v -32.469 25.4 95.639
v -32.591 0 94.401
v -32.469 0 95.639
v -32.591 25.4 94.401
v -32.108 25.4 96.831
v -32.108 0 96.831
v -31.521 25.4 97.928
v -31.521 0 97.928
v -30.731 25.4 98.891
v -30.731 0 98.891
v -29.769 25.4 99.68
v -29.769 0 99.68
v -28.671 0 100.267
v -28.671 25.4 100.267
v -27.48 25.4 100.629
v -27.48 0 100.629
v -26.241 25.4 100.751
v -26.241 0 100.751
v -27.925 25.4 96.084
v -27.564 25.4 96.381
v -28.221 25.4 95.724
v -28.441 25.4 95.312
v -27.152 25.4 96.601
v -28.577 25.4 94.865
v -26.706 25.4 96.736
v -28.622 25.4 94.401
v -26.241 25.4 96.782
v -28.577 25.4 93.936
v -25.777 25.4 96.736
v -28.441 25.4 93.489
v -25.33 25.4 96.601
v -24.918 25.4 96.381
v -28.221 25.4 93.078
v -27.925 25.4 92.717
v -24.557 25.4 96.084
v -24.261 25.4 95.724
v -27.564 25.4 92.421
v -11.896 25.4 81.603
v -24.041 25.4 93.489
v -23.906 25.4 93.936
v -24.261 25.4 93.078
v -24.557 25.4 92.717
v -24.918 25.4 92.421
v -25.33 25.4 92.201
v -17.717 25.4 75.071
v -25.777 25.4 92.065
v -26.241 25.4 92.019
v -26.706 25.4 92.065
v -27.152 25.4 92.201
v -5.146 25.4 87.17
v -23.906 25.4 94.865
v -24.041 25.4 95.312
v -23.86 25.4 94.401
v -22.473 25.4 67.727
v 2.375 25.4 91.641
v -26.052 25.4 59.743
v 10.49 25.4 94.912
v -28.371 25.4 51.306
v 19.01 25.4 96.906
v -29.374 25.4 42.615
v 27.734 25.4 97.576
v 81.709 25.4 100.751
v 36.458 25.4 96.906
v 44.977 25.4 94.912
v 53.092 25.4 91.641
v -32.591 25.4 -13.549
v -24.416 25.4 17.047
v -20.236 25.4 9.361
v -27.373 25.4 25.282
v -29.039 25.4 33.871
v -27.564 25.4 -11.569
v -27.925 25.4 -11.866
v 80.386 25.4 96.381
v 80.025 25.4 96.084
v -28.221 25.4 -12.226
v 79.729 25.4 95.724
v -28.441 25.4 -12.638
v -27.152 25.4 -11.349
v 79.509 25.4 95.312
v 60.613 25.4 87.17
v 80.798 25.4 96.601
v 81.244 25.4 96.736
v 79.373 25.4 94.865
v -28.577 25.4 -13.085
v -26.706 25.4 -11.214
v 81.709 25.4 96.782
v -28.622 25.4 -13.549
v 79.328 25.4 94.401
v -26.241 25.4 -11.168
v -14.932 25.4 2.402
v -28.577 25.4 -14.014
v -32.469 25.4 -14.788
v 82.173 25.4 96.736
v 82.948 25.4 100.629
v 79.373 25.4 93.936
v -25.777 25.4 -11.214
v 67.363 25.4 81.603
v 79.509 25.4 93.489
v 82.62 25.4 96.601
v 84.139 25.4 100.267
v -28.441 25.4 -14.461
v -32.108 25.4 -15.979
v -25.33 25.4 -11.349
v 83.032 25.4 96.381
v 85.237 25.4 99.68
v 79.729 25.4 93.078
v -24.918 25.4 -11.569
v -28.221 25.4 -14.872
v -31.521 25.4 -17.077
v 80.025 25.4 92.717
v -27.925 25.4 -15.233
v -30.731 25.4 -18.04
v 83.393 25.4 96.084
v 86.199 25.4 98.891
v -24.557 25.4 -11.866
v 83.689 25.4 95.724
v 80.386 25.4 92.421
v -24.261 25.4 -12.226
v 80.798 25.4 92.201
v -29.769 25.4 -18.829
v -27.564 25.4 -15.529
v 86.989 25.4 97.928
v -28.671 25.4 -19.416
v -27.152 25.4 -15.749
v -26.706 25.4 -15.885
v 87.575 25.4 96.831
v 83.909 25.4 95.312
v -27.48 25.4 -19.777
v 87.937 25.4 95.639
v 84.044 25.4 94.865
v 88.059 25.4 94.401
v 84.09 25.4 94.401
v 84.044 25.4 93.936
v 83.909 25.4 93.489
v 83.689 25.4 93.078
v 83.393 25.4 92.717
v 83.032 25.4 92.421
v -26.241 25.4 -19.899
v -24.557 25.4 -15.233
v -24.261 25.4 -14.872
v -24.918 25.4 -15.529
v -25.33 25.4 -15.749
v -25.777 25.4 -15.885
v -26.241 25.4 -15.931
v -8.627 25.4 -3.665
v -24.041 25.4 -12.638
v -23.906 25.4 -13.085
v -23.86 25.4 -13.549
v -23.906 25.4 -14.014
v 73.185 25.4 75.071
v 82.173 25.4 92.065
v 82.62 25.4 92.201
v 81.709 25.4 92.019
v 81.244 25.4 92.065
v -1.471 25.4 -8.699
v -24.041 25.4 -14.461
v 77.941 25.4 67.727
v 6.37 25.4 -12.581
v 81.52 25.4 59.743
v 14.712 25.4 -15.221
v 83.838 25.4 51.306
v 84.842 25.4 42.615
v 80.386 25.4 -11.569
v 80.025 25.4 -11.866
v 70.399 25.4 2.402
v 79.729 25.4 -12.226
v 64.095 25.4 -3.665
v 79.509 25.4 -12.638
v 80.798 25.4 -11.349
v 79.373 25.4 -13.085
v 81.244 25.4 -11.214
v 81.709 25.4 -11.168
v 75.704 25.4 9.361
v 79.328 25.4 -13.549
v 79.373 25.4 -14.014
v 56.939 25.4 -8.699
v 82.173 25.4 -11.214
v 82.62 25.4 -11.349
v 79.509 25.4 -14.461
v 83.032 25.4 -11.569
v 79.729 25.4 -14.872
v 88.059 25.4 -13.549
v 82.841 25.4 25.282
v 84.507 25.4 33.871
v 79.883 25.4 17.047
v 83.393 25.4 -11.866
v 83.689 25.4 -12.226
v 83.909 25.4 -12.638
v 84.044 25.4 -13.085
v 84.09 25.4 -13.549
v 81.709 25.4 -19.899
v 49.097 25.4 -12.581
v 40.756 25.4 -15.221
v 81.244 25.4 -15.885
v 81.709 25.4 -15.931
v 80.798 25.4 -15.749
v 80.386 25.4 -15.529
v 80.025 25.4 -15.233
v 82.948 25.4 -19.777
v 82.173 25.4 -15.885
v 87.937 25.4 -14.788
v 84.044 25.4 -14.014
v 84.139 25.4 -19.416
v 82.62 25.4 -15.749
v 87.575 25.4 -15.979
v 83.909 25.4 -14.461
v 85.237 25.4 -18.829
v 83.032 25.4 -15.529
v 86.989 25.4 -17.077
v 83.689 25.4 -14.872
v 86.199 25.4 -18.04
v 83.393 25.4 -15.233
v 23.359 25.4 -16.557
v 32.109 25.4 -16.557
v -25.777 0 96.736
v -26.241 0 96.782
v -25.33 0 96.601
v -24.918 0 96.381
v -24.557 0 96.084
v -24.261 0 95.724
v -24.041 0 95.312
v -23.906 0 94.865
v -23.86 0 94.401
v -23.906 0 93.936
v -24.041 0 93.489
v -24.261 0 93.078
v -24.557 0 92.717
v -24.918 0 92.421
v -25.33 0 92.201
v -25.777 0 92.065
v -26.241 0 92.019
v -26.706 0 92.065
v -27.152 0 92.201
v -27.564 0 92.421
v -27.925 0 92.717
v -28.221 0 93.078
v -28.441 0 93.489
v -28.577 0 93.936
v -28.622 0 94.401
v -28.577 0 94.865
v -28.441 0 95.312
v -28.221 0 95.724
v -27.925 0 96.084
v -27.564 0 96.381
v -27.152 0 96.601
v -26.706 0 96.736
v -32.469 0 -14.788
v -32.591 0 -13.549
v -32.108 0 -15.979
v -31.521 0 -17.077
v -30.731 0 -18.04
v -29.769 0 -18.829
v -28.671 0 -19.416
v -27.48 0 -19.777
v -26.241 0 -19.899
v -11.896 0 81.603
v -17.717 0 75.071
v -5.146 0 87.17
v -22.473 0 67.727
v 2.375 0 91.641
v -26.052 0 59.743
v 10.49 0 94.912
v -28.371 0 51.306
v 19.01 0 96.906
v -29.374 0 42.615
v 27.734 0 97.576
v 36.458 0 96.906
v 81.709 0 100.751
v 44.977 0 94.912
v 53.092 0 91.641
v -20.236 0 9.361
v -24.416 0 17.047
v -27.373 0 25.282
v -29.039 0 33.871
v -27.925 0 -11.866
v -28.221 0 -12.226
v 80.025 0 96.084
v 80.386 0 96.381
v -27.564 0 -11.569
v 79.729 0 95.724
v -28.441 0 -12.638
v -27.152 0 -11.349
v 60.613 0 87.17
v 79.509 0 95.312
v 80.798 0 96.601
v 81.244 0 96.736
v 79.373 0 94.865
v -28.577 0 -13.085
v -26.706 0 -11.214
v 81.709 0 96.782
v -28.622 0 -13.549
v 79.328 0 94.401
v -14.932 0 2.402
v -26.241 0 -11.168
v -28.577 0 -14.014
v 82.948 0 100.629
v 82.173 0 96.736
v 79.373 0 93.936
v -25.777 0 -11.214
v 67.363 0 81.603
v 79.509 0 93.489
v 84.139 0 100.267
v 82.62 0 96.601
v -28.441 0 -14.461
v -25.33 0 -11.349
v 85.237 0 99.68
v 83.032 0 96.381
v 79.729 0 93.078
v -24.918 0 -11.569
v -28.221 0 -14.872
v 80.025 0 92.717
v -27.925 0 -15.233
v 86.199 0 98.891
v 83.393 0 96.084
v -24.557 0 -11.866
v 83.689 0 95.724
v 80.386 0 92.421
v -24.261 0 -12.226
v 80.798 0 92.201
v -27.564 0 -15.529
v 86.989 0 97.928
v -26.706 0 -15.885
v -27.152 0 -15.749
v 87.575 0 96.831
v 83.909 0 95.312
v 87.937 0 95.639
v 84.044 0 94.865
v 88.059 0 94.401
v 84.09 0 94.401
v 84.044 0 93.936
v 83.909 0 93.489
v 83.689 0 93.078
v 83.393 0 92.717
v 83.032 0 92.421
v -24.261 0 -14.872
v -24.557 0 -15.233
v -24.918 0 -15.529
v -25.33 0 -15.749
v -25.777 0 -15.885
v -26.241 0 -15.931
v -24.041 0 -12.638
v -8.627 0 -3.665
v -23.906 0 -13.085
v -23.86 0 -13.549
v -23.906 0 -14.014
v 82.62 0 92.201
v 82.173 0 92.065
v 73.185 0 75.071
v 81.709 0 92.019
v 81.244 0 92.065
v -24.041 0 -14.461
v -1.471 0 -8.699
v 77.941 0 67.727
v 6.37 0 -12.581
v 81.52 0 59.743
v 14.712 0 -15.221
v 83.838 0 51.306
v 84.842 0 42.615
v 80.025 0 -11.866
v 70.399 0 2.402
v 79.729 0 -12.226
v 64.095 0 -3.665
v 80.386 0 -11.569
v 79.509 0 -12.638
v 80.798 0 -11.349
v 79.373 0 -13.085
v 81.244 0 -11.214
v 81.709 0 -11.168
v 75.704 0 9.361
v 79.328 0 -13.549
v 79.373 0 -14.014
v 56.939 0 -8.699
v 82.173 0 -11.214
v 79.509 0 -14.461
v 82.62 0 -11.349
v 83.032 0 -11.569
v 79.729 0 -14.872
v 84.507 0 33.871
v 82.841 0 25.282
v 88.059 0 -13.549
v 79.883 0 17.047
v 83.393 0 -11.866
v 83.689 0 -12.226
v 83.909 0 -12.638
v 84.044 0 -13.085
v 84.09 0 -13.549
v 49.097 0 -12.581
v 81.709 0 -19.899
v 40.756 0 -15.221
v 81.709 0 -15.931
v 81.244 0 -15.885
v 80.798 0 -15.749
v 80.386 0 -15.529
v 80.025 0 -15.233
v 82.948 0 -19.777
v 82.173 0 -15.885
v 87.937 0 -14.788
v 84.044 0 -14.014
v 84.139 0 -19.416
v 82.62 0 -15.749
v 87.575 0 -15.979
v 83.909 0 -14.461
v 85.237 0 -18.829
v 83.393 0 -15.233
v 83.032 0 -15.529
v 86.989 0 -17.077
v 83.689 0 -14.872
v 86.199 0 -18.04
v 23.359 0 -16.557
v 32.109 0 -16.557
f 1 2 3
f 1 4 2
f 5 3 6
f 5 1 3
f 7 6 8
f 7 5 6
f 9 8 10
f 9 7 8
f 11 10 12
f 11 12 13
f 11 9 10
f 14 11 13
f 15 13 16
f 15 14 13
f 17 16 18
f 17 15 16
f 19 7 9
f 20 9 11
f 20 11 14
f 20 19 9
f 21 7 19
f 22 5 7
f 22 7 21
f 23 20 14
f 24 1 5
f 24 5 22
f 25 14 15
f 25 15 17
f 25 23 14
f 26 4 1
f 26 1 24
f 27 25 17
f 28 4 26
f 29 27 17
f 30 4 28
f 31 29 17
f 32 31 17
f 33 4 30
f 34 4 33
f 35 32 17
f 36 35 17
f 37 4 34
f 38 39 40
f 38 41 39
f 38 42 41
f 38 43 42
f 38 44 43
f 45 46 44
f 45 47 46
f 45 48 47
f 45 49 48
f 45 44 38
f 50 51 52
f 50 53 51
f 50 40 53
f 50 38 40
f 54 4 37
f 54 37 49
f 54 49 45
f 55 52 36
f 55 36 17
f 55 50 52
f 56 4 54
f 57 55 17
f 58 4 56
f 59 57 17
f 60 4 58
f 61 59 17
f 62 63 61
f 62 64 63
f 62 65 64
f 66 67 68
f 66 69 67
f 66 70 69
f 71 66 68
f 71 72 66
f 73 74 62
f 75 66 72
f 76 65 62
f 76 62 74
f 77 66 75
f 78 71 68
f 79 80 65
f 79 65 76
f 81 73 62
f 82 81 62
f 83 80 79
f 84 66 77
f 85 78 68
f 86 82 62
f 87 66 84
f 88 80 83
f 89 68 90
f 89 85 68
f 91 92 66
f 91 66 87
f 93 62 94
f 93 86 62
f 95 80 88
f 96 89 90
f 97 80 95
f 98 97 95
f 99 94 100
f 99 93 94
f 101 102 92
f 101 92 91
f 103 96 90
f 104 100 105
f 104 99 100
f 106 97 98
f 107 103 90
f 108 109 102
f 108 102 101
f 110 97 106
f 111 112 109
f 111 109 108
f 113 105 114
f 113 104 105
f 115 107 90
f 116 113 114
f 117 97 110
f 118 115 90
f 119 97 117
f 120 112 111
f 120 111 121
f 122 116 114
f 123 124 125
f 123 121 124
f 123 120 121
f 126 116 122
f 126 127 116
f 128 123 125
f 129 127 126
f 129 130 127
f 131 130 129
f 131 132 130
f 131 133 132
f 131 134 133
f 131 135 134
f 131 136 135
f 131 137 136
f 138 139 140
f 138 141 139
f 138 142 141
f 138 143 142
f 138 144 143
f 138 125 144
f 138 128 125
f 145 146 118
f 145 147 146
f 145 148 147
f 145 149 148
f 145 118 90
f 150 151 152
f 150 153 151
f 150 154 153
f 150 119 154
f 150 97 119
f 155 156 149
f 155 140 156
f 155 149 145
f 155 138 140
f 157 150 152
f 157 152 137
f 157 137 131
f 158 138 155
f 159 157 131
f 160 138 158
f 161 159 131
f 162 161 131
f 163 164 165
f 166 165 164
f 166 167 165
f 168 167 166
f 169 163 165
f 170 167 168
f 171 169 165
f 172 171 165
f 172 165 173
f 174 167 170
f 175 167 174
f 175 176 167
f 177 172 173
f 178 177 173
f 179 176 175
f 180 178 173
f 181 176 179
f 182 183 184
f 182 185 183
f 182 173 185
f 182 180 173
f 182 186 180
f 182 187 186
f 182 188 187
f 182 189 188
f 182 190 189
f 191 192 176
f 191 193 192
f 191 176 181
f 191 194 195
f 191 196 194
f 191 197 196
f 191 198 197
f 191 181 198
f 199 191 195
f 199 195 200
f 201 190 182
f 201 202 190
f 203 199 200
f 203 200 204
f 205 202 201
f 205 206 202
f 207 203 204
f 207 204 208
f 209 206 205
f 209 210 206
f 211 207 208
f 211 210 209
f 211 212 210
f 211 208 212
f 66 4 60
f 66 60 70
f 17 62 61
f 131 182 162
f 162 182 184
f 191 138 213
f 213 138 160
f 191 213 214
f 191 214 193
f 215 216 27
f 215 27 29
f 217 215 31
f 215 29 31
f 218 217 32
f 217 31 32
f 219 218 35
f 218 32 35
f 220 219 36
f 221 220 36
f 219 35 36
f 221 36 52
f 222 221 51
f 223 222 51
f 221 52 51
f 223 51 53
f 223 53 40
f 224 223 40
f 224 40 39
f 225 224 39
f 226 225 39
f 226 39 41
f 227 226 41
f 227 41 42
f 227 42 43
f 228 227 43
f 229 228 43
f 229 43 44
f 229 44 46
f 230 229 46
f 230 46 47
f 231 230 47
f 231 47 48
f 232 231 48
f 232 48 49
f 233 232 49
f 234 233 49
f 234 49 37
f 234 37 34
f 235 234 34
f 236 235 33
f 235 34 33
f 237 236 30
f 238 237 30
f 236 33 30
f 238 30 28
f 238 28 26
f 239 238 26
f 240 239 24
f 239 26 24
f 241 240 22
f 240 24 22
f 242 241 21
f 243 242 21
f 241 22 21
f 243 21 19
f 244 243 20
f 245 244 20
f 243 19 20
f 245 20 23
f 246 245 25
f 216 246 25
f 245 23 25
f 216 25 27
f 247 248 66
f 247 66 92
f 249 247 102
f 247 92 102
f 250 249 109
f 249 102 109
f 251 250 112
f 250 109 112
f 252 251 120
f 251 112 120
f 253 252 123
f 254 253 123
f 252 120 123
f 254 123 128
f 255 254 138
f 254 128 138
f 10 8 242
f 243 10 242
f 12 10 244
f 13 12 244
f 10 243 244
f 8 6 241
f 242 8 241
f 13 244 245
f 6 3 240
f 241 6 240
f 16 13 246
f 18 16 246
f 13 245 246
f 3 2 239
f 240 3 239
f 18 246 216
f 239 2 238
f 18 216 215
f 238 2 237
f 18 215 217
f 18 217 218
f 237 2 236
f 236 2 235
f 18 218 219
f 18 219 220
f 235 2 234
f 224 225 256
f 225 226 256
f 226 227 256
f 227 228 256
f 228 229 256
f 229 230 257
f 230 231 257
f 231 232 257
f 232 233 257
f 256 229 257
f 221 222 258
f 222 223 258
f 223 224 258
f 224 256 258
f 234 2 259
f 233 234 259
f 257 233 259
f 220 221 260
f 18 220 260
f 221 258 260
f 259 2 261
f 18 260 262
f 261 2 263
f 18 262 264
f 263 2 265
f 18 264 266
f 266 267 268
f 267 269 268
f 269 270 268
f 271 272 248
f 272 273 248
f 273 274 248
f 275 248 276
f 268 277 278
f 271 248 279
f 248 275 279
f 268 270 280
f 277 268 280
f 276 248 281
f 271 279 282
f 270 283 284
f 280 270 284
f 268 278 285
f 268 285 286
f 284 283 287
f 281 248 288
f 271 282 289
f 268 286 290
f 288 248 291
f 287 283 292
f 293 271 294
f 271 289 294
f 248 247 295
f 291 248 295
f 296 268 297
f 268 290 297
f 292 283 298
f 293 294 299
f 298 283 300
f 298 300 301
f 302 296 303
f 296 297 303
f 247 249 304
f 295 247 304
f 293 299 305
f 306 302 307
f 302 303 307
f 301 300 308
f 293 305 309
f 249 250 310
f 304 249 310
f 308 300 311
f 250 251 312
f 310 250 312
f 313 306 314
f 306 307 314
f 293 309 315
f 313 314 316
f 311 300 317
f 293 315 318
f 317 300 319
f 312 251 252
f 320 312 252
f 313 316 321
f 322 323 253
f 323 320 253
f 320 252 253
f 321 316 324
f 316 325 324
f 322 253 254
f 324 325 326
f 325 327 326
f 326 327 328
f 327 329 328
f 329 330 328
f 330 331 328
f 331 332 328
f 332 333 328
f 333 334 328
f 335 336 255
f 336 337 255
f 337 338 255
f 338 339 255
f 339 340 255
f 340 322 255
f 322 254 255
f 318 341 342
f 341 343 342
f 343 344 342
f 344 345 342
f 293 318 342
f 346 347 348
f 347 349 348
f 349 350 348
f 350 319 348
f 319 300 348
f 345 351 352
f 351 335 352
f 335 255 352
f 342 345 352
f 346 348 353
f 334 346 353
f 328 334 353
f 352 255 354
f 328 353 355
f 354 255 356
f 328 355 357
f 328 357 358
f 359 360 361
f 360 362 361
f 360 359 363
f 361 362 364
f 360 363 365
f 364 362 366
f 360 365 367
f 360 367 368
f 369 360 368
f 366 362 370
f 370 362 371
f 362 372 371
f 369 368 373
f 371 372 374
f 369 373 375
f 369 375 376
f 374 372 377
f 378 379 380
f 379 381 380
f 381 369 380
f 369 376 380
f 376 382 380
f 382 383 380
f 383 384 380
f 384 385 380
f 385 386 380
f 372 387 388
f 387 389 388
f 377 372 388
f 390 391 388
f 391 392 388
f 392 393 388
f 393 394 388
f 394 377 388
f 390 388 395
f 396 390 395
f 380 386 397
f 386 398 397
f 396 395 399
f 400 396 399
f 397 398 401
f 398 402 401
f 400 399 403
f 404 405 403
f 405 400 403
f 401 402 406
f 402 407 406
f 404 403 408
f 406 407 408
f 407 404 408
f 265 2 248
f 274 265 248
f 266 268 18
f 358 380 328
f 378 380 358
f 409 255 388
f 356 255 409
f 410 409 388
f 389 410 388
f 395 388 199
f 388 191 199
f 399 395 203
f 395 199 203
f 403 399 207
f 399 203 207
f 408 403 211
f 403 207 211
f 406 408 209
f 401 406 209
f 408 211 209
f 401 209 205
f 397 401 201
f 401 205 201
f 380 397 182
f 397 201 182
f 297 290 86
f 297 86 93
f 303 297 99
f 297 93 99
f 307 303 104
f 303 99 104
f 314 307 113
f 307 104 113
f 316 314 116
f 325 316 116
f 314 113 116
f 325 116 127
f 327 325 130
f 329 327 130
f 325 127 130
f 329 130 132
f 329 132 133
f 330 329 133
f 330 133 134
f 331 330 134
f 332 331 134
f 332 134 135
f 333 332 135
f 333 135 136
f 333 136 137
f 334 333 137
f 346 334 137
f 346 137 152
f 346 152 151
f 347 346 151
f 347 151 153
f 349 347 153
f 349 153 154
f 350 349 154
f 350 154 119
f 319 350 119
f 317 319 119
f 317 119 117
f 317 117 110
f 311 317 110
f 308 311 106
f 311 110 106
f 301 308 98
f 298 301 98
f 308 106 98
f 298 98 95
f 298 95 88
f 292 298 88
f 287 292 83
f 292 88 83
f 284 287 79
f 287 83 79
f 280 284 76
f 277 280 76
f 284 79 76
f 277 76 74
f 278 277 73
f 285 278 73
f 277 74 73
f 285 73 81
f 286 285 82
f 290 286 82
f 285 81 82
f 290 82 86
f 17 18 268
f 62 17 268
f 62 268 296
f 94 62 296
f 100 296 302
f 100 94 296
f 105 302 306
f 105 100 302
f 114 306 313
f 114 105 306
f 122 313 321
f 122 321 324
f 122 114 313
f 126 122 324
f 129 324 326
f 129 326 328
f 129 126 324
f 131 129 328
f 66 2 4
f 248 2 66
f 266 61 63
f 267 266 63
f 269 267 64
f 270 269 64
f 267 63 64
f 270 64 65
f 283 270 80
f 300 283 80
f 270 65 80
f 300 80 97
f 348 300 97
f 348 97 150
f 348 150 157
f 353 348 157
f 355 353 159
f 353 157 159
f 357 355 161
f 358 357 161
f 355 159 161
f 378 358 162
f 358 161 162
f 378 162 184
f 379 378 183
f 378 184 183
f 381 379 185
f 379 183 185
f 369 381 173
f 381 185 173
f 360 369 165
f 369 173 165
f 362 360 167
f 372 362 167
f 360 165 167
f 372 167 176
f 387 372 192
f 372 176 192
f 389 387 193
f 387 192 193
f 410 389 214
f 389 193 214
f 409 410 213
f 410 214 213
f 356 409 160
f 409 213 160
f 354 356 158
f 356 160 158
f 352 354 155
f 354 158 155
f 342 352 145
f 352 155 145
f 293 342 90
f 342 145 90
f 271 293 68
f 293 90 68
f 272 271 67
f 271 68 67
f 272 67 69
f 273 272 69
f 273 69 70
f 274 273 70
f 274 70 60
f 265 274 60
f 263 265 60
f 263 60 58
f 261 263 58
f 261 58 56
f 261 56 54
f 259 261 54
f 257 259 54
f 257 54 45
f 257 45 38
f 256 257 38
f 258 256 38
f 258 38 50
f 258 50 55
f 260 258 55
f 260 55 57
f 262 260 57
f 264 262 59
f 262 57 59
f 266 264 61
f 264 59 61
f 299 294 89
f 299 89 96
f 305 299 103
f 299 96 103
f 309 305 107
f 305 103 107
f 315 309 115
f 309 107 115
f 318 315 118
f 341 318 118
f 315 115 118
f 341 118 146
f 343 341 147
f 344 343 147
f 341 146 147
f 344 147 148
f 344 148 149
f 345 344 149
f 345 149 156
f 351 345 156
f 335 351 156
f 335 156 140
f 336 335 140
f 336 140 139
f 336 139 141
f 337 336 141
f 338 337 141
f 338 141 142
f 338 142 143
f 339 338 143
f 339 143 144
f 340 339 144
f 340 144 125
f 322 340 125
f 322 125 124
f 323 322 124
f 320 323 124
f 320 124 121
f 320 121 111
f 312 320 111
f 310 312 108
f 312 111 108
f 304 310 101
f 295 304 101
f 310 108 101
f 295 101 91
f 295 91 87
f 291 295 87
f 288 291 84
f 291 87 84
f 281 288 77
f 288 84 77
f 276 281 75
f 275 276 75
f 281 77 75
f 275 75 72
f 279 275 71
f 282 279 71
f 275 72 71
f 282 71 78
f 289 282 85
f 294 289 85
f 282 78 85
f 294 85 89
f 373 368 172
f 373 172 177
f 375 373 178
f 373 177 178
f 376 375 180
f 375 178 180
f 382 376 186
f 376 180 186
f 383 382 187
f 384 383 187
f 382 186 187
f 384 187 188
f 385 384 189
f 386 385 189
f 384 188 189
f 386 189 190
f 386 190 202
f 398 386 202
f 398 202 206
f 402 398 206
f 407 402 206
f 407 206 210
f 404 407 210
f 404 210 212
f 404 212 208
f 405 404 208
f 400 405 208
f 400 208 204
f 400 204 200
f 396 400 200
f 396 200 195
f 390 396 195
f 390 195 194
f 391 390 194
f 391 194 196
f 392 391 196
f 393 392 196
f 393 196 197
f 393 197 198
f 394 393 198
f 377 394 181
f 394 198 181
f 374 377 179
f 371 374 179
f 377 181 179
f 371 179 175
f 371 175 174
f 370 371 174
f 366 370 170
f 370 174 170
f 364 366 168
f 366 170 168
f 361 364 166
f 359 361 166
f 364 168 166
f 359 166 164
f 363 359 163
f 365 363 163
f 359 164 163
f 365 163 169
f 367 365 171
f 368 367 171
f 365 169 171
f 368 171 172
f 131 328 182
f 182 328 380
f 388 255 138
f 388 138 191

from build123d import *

# Parameters (mm, degrees)
SKETCH1_W           = 120.65
SKETCH1_H           = 120.65
BOSS_EXTRUDE1_DEPTH = 25.4
FILLET1_R           = 6.35
FILLET2_R           = 6.35
SKETCH2_R           = 2.38125
CUT_EXTRUDE1_DEPTH  = 137.199111623
SKETCH4_R           = 57.15
CUT_EXTRUDE2_DEPTH  = 25.4


with BuildPart() as part:
    # Sketch1 → Boss-Extrude1 (new body)
    with BuildSketch(Plane(origin=(0, 0, 0), x_dir=(1, 0, 0), z_dir=(0, 1, 0))):
        with Locations((27.733831169, -40.425584416)):
            Rectangle(SKETCH1_W, SKETCH1_H)
    extrude(amount=BOSS_EXTRUDE1_DEPTH)

    # Fillet1
    fillet1_edges = [part.edges().sort_by_distance(p)[0] for p in [
        (-32.591168831, 12.7, 100.750584416),
    ]]
    fillet(fillet1_edges, radius=FILLET1_R)

    # Fillet2
    fillet2_edges = [part.edges().sort_by_distance(p)[0] for p in [
        (-32.591168831, 12.7, -19.899415584),
        (88.058831169, 12.7, -19.899415584),
        (88.058831169, 12.7, 100.750584416),
    ]]
    fillet(fillet2_edges, radius=FILLET2_R)

    # Sketch2 → Cut-Extrude1 (cut, through all)
    with BuildSketch(Plane(origin=(0, 25.4, 0), x_dir=(1, 0, 0), z_dir=(0, 1, 0))):
        with Locations(Location((-26.241168831, -94.400584416, 0), (0, 0, 270))):
            Circle(SKETCH2_R)
        with Locations(Location((-26.241168831, 13.549415584, 0), (0, 0, 270))):
            Circle(SKETCH2_R)
        with Locations(Location((81.708831169, 13.549415584, 0), (0, 0, 270))):
            Circle(SKETCH2_R)
        with Locations(Location((81.708831169, -94.400584416, 0), (0, 0, 270))):
            Circle(SKETCH2_R)
    extrude(amount=-CUT_EXTRUDE1_DEPTH, mode=Mode.SUBTRACT)

    # Sketch4 → Cut-Extrude2 (cut)
    with BuildSketch(Plane(origin=(0, 25.4, 0), x_dir=(1, 0, 0), z_dir=(0, 1, 0))):
        with Locations(Location((27.733831169, -40.425584416, 0), (0, 0, 270))):
            Circle(SKETCH4_R)
    extrude(amount=-CUT_EXTRUDE2_DEPTH, mode=Mode.SUBTRACT)


solid = part.part
